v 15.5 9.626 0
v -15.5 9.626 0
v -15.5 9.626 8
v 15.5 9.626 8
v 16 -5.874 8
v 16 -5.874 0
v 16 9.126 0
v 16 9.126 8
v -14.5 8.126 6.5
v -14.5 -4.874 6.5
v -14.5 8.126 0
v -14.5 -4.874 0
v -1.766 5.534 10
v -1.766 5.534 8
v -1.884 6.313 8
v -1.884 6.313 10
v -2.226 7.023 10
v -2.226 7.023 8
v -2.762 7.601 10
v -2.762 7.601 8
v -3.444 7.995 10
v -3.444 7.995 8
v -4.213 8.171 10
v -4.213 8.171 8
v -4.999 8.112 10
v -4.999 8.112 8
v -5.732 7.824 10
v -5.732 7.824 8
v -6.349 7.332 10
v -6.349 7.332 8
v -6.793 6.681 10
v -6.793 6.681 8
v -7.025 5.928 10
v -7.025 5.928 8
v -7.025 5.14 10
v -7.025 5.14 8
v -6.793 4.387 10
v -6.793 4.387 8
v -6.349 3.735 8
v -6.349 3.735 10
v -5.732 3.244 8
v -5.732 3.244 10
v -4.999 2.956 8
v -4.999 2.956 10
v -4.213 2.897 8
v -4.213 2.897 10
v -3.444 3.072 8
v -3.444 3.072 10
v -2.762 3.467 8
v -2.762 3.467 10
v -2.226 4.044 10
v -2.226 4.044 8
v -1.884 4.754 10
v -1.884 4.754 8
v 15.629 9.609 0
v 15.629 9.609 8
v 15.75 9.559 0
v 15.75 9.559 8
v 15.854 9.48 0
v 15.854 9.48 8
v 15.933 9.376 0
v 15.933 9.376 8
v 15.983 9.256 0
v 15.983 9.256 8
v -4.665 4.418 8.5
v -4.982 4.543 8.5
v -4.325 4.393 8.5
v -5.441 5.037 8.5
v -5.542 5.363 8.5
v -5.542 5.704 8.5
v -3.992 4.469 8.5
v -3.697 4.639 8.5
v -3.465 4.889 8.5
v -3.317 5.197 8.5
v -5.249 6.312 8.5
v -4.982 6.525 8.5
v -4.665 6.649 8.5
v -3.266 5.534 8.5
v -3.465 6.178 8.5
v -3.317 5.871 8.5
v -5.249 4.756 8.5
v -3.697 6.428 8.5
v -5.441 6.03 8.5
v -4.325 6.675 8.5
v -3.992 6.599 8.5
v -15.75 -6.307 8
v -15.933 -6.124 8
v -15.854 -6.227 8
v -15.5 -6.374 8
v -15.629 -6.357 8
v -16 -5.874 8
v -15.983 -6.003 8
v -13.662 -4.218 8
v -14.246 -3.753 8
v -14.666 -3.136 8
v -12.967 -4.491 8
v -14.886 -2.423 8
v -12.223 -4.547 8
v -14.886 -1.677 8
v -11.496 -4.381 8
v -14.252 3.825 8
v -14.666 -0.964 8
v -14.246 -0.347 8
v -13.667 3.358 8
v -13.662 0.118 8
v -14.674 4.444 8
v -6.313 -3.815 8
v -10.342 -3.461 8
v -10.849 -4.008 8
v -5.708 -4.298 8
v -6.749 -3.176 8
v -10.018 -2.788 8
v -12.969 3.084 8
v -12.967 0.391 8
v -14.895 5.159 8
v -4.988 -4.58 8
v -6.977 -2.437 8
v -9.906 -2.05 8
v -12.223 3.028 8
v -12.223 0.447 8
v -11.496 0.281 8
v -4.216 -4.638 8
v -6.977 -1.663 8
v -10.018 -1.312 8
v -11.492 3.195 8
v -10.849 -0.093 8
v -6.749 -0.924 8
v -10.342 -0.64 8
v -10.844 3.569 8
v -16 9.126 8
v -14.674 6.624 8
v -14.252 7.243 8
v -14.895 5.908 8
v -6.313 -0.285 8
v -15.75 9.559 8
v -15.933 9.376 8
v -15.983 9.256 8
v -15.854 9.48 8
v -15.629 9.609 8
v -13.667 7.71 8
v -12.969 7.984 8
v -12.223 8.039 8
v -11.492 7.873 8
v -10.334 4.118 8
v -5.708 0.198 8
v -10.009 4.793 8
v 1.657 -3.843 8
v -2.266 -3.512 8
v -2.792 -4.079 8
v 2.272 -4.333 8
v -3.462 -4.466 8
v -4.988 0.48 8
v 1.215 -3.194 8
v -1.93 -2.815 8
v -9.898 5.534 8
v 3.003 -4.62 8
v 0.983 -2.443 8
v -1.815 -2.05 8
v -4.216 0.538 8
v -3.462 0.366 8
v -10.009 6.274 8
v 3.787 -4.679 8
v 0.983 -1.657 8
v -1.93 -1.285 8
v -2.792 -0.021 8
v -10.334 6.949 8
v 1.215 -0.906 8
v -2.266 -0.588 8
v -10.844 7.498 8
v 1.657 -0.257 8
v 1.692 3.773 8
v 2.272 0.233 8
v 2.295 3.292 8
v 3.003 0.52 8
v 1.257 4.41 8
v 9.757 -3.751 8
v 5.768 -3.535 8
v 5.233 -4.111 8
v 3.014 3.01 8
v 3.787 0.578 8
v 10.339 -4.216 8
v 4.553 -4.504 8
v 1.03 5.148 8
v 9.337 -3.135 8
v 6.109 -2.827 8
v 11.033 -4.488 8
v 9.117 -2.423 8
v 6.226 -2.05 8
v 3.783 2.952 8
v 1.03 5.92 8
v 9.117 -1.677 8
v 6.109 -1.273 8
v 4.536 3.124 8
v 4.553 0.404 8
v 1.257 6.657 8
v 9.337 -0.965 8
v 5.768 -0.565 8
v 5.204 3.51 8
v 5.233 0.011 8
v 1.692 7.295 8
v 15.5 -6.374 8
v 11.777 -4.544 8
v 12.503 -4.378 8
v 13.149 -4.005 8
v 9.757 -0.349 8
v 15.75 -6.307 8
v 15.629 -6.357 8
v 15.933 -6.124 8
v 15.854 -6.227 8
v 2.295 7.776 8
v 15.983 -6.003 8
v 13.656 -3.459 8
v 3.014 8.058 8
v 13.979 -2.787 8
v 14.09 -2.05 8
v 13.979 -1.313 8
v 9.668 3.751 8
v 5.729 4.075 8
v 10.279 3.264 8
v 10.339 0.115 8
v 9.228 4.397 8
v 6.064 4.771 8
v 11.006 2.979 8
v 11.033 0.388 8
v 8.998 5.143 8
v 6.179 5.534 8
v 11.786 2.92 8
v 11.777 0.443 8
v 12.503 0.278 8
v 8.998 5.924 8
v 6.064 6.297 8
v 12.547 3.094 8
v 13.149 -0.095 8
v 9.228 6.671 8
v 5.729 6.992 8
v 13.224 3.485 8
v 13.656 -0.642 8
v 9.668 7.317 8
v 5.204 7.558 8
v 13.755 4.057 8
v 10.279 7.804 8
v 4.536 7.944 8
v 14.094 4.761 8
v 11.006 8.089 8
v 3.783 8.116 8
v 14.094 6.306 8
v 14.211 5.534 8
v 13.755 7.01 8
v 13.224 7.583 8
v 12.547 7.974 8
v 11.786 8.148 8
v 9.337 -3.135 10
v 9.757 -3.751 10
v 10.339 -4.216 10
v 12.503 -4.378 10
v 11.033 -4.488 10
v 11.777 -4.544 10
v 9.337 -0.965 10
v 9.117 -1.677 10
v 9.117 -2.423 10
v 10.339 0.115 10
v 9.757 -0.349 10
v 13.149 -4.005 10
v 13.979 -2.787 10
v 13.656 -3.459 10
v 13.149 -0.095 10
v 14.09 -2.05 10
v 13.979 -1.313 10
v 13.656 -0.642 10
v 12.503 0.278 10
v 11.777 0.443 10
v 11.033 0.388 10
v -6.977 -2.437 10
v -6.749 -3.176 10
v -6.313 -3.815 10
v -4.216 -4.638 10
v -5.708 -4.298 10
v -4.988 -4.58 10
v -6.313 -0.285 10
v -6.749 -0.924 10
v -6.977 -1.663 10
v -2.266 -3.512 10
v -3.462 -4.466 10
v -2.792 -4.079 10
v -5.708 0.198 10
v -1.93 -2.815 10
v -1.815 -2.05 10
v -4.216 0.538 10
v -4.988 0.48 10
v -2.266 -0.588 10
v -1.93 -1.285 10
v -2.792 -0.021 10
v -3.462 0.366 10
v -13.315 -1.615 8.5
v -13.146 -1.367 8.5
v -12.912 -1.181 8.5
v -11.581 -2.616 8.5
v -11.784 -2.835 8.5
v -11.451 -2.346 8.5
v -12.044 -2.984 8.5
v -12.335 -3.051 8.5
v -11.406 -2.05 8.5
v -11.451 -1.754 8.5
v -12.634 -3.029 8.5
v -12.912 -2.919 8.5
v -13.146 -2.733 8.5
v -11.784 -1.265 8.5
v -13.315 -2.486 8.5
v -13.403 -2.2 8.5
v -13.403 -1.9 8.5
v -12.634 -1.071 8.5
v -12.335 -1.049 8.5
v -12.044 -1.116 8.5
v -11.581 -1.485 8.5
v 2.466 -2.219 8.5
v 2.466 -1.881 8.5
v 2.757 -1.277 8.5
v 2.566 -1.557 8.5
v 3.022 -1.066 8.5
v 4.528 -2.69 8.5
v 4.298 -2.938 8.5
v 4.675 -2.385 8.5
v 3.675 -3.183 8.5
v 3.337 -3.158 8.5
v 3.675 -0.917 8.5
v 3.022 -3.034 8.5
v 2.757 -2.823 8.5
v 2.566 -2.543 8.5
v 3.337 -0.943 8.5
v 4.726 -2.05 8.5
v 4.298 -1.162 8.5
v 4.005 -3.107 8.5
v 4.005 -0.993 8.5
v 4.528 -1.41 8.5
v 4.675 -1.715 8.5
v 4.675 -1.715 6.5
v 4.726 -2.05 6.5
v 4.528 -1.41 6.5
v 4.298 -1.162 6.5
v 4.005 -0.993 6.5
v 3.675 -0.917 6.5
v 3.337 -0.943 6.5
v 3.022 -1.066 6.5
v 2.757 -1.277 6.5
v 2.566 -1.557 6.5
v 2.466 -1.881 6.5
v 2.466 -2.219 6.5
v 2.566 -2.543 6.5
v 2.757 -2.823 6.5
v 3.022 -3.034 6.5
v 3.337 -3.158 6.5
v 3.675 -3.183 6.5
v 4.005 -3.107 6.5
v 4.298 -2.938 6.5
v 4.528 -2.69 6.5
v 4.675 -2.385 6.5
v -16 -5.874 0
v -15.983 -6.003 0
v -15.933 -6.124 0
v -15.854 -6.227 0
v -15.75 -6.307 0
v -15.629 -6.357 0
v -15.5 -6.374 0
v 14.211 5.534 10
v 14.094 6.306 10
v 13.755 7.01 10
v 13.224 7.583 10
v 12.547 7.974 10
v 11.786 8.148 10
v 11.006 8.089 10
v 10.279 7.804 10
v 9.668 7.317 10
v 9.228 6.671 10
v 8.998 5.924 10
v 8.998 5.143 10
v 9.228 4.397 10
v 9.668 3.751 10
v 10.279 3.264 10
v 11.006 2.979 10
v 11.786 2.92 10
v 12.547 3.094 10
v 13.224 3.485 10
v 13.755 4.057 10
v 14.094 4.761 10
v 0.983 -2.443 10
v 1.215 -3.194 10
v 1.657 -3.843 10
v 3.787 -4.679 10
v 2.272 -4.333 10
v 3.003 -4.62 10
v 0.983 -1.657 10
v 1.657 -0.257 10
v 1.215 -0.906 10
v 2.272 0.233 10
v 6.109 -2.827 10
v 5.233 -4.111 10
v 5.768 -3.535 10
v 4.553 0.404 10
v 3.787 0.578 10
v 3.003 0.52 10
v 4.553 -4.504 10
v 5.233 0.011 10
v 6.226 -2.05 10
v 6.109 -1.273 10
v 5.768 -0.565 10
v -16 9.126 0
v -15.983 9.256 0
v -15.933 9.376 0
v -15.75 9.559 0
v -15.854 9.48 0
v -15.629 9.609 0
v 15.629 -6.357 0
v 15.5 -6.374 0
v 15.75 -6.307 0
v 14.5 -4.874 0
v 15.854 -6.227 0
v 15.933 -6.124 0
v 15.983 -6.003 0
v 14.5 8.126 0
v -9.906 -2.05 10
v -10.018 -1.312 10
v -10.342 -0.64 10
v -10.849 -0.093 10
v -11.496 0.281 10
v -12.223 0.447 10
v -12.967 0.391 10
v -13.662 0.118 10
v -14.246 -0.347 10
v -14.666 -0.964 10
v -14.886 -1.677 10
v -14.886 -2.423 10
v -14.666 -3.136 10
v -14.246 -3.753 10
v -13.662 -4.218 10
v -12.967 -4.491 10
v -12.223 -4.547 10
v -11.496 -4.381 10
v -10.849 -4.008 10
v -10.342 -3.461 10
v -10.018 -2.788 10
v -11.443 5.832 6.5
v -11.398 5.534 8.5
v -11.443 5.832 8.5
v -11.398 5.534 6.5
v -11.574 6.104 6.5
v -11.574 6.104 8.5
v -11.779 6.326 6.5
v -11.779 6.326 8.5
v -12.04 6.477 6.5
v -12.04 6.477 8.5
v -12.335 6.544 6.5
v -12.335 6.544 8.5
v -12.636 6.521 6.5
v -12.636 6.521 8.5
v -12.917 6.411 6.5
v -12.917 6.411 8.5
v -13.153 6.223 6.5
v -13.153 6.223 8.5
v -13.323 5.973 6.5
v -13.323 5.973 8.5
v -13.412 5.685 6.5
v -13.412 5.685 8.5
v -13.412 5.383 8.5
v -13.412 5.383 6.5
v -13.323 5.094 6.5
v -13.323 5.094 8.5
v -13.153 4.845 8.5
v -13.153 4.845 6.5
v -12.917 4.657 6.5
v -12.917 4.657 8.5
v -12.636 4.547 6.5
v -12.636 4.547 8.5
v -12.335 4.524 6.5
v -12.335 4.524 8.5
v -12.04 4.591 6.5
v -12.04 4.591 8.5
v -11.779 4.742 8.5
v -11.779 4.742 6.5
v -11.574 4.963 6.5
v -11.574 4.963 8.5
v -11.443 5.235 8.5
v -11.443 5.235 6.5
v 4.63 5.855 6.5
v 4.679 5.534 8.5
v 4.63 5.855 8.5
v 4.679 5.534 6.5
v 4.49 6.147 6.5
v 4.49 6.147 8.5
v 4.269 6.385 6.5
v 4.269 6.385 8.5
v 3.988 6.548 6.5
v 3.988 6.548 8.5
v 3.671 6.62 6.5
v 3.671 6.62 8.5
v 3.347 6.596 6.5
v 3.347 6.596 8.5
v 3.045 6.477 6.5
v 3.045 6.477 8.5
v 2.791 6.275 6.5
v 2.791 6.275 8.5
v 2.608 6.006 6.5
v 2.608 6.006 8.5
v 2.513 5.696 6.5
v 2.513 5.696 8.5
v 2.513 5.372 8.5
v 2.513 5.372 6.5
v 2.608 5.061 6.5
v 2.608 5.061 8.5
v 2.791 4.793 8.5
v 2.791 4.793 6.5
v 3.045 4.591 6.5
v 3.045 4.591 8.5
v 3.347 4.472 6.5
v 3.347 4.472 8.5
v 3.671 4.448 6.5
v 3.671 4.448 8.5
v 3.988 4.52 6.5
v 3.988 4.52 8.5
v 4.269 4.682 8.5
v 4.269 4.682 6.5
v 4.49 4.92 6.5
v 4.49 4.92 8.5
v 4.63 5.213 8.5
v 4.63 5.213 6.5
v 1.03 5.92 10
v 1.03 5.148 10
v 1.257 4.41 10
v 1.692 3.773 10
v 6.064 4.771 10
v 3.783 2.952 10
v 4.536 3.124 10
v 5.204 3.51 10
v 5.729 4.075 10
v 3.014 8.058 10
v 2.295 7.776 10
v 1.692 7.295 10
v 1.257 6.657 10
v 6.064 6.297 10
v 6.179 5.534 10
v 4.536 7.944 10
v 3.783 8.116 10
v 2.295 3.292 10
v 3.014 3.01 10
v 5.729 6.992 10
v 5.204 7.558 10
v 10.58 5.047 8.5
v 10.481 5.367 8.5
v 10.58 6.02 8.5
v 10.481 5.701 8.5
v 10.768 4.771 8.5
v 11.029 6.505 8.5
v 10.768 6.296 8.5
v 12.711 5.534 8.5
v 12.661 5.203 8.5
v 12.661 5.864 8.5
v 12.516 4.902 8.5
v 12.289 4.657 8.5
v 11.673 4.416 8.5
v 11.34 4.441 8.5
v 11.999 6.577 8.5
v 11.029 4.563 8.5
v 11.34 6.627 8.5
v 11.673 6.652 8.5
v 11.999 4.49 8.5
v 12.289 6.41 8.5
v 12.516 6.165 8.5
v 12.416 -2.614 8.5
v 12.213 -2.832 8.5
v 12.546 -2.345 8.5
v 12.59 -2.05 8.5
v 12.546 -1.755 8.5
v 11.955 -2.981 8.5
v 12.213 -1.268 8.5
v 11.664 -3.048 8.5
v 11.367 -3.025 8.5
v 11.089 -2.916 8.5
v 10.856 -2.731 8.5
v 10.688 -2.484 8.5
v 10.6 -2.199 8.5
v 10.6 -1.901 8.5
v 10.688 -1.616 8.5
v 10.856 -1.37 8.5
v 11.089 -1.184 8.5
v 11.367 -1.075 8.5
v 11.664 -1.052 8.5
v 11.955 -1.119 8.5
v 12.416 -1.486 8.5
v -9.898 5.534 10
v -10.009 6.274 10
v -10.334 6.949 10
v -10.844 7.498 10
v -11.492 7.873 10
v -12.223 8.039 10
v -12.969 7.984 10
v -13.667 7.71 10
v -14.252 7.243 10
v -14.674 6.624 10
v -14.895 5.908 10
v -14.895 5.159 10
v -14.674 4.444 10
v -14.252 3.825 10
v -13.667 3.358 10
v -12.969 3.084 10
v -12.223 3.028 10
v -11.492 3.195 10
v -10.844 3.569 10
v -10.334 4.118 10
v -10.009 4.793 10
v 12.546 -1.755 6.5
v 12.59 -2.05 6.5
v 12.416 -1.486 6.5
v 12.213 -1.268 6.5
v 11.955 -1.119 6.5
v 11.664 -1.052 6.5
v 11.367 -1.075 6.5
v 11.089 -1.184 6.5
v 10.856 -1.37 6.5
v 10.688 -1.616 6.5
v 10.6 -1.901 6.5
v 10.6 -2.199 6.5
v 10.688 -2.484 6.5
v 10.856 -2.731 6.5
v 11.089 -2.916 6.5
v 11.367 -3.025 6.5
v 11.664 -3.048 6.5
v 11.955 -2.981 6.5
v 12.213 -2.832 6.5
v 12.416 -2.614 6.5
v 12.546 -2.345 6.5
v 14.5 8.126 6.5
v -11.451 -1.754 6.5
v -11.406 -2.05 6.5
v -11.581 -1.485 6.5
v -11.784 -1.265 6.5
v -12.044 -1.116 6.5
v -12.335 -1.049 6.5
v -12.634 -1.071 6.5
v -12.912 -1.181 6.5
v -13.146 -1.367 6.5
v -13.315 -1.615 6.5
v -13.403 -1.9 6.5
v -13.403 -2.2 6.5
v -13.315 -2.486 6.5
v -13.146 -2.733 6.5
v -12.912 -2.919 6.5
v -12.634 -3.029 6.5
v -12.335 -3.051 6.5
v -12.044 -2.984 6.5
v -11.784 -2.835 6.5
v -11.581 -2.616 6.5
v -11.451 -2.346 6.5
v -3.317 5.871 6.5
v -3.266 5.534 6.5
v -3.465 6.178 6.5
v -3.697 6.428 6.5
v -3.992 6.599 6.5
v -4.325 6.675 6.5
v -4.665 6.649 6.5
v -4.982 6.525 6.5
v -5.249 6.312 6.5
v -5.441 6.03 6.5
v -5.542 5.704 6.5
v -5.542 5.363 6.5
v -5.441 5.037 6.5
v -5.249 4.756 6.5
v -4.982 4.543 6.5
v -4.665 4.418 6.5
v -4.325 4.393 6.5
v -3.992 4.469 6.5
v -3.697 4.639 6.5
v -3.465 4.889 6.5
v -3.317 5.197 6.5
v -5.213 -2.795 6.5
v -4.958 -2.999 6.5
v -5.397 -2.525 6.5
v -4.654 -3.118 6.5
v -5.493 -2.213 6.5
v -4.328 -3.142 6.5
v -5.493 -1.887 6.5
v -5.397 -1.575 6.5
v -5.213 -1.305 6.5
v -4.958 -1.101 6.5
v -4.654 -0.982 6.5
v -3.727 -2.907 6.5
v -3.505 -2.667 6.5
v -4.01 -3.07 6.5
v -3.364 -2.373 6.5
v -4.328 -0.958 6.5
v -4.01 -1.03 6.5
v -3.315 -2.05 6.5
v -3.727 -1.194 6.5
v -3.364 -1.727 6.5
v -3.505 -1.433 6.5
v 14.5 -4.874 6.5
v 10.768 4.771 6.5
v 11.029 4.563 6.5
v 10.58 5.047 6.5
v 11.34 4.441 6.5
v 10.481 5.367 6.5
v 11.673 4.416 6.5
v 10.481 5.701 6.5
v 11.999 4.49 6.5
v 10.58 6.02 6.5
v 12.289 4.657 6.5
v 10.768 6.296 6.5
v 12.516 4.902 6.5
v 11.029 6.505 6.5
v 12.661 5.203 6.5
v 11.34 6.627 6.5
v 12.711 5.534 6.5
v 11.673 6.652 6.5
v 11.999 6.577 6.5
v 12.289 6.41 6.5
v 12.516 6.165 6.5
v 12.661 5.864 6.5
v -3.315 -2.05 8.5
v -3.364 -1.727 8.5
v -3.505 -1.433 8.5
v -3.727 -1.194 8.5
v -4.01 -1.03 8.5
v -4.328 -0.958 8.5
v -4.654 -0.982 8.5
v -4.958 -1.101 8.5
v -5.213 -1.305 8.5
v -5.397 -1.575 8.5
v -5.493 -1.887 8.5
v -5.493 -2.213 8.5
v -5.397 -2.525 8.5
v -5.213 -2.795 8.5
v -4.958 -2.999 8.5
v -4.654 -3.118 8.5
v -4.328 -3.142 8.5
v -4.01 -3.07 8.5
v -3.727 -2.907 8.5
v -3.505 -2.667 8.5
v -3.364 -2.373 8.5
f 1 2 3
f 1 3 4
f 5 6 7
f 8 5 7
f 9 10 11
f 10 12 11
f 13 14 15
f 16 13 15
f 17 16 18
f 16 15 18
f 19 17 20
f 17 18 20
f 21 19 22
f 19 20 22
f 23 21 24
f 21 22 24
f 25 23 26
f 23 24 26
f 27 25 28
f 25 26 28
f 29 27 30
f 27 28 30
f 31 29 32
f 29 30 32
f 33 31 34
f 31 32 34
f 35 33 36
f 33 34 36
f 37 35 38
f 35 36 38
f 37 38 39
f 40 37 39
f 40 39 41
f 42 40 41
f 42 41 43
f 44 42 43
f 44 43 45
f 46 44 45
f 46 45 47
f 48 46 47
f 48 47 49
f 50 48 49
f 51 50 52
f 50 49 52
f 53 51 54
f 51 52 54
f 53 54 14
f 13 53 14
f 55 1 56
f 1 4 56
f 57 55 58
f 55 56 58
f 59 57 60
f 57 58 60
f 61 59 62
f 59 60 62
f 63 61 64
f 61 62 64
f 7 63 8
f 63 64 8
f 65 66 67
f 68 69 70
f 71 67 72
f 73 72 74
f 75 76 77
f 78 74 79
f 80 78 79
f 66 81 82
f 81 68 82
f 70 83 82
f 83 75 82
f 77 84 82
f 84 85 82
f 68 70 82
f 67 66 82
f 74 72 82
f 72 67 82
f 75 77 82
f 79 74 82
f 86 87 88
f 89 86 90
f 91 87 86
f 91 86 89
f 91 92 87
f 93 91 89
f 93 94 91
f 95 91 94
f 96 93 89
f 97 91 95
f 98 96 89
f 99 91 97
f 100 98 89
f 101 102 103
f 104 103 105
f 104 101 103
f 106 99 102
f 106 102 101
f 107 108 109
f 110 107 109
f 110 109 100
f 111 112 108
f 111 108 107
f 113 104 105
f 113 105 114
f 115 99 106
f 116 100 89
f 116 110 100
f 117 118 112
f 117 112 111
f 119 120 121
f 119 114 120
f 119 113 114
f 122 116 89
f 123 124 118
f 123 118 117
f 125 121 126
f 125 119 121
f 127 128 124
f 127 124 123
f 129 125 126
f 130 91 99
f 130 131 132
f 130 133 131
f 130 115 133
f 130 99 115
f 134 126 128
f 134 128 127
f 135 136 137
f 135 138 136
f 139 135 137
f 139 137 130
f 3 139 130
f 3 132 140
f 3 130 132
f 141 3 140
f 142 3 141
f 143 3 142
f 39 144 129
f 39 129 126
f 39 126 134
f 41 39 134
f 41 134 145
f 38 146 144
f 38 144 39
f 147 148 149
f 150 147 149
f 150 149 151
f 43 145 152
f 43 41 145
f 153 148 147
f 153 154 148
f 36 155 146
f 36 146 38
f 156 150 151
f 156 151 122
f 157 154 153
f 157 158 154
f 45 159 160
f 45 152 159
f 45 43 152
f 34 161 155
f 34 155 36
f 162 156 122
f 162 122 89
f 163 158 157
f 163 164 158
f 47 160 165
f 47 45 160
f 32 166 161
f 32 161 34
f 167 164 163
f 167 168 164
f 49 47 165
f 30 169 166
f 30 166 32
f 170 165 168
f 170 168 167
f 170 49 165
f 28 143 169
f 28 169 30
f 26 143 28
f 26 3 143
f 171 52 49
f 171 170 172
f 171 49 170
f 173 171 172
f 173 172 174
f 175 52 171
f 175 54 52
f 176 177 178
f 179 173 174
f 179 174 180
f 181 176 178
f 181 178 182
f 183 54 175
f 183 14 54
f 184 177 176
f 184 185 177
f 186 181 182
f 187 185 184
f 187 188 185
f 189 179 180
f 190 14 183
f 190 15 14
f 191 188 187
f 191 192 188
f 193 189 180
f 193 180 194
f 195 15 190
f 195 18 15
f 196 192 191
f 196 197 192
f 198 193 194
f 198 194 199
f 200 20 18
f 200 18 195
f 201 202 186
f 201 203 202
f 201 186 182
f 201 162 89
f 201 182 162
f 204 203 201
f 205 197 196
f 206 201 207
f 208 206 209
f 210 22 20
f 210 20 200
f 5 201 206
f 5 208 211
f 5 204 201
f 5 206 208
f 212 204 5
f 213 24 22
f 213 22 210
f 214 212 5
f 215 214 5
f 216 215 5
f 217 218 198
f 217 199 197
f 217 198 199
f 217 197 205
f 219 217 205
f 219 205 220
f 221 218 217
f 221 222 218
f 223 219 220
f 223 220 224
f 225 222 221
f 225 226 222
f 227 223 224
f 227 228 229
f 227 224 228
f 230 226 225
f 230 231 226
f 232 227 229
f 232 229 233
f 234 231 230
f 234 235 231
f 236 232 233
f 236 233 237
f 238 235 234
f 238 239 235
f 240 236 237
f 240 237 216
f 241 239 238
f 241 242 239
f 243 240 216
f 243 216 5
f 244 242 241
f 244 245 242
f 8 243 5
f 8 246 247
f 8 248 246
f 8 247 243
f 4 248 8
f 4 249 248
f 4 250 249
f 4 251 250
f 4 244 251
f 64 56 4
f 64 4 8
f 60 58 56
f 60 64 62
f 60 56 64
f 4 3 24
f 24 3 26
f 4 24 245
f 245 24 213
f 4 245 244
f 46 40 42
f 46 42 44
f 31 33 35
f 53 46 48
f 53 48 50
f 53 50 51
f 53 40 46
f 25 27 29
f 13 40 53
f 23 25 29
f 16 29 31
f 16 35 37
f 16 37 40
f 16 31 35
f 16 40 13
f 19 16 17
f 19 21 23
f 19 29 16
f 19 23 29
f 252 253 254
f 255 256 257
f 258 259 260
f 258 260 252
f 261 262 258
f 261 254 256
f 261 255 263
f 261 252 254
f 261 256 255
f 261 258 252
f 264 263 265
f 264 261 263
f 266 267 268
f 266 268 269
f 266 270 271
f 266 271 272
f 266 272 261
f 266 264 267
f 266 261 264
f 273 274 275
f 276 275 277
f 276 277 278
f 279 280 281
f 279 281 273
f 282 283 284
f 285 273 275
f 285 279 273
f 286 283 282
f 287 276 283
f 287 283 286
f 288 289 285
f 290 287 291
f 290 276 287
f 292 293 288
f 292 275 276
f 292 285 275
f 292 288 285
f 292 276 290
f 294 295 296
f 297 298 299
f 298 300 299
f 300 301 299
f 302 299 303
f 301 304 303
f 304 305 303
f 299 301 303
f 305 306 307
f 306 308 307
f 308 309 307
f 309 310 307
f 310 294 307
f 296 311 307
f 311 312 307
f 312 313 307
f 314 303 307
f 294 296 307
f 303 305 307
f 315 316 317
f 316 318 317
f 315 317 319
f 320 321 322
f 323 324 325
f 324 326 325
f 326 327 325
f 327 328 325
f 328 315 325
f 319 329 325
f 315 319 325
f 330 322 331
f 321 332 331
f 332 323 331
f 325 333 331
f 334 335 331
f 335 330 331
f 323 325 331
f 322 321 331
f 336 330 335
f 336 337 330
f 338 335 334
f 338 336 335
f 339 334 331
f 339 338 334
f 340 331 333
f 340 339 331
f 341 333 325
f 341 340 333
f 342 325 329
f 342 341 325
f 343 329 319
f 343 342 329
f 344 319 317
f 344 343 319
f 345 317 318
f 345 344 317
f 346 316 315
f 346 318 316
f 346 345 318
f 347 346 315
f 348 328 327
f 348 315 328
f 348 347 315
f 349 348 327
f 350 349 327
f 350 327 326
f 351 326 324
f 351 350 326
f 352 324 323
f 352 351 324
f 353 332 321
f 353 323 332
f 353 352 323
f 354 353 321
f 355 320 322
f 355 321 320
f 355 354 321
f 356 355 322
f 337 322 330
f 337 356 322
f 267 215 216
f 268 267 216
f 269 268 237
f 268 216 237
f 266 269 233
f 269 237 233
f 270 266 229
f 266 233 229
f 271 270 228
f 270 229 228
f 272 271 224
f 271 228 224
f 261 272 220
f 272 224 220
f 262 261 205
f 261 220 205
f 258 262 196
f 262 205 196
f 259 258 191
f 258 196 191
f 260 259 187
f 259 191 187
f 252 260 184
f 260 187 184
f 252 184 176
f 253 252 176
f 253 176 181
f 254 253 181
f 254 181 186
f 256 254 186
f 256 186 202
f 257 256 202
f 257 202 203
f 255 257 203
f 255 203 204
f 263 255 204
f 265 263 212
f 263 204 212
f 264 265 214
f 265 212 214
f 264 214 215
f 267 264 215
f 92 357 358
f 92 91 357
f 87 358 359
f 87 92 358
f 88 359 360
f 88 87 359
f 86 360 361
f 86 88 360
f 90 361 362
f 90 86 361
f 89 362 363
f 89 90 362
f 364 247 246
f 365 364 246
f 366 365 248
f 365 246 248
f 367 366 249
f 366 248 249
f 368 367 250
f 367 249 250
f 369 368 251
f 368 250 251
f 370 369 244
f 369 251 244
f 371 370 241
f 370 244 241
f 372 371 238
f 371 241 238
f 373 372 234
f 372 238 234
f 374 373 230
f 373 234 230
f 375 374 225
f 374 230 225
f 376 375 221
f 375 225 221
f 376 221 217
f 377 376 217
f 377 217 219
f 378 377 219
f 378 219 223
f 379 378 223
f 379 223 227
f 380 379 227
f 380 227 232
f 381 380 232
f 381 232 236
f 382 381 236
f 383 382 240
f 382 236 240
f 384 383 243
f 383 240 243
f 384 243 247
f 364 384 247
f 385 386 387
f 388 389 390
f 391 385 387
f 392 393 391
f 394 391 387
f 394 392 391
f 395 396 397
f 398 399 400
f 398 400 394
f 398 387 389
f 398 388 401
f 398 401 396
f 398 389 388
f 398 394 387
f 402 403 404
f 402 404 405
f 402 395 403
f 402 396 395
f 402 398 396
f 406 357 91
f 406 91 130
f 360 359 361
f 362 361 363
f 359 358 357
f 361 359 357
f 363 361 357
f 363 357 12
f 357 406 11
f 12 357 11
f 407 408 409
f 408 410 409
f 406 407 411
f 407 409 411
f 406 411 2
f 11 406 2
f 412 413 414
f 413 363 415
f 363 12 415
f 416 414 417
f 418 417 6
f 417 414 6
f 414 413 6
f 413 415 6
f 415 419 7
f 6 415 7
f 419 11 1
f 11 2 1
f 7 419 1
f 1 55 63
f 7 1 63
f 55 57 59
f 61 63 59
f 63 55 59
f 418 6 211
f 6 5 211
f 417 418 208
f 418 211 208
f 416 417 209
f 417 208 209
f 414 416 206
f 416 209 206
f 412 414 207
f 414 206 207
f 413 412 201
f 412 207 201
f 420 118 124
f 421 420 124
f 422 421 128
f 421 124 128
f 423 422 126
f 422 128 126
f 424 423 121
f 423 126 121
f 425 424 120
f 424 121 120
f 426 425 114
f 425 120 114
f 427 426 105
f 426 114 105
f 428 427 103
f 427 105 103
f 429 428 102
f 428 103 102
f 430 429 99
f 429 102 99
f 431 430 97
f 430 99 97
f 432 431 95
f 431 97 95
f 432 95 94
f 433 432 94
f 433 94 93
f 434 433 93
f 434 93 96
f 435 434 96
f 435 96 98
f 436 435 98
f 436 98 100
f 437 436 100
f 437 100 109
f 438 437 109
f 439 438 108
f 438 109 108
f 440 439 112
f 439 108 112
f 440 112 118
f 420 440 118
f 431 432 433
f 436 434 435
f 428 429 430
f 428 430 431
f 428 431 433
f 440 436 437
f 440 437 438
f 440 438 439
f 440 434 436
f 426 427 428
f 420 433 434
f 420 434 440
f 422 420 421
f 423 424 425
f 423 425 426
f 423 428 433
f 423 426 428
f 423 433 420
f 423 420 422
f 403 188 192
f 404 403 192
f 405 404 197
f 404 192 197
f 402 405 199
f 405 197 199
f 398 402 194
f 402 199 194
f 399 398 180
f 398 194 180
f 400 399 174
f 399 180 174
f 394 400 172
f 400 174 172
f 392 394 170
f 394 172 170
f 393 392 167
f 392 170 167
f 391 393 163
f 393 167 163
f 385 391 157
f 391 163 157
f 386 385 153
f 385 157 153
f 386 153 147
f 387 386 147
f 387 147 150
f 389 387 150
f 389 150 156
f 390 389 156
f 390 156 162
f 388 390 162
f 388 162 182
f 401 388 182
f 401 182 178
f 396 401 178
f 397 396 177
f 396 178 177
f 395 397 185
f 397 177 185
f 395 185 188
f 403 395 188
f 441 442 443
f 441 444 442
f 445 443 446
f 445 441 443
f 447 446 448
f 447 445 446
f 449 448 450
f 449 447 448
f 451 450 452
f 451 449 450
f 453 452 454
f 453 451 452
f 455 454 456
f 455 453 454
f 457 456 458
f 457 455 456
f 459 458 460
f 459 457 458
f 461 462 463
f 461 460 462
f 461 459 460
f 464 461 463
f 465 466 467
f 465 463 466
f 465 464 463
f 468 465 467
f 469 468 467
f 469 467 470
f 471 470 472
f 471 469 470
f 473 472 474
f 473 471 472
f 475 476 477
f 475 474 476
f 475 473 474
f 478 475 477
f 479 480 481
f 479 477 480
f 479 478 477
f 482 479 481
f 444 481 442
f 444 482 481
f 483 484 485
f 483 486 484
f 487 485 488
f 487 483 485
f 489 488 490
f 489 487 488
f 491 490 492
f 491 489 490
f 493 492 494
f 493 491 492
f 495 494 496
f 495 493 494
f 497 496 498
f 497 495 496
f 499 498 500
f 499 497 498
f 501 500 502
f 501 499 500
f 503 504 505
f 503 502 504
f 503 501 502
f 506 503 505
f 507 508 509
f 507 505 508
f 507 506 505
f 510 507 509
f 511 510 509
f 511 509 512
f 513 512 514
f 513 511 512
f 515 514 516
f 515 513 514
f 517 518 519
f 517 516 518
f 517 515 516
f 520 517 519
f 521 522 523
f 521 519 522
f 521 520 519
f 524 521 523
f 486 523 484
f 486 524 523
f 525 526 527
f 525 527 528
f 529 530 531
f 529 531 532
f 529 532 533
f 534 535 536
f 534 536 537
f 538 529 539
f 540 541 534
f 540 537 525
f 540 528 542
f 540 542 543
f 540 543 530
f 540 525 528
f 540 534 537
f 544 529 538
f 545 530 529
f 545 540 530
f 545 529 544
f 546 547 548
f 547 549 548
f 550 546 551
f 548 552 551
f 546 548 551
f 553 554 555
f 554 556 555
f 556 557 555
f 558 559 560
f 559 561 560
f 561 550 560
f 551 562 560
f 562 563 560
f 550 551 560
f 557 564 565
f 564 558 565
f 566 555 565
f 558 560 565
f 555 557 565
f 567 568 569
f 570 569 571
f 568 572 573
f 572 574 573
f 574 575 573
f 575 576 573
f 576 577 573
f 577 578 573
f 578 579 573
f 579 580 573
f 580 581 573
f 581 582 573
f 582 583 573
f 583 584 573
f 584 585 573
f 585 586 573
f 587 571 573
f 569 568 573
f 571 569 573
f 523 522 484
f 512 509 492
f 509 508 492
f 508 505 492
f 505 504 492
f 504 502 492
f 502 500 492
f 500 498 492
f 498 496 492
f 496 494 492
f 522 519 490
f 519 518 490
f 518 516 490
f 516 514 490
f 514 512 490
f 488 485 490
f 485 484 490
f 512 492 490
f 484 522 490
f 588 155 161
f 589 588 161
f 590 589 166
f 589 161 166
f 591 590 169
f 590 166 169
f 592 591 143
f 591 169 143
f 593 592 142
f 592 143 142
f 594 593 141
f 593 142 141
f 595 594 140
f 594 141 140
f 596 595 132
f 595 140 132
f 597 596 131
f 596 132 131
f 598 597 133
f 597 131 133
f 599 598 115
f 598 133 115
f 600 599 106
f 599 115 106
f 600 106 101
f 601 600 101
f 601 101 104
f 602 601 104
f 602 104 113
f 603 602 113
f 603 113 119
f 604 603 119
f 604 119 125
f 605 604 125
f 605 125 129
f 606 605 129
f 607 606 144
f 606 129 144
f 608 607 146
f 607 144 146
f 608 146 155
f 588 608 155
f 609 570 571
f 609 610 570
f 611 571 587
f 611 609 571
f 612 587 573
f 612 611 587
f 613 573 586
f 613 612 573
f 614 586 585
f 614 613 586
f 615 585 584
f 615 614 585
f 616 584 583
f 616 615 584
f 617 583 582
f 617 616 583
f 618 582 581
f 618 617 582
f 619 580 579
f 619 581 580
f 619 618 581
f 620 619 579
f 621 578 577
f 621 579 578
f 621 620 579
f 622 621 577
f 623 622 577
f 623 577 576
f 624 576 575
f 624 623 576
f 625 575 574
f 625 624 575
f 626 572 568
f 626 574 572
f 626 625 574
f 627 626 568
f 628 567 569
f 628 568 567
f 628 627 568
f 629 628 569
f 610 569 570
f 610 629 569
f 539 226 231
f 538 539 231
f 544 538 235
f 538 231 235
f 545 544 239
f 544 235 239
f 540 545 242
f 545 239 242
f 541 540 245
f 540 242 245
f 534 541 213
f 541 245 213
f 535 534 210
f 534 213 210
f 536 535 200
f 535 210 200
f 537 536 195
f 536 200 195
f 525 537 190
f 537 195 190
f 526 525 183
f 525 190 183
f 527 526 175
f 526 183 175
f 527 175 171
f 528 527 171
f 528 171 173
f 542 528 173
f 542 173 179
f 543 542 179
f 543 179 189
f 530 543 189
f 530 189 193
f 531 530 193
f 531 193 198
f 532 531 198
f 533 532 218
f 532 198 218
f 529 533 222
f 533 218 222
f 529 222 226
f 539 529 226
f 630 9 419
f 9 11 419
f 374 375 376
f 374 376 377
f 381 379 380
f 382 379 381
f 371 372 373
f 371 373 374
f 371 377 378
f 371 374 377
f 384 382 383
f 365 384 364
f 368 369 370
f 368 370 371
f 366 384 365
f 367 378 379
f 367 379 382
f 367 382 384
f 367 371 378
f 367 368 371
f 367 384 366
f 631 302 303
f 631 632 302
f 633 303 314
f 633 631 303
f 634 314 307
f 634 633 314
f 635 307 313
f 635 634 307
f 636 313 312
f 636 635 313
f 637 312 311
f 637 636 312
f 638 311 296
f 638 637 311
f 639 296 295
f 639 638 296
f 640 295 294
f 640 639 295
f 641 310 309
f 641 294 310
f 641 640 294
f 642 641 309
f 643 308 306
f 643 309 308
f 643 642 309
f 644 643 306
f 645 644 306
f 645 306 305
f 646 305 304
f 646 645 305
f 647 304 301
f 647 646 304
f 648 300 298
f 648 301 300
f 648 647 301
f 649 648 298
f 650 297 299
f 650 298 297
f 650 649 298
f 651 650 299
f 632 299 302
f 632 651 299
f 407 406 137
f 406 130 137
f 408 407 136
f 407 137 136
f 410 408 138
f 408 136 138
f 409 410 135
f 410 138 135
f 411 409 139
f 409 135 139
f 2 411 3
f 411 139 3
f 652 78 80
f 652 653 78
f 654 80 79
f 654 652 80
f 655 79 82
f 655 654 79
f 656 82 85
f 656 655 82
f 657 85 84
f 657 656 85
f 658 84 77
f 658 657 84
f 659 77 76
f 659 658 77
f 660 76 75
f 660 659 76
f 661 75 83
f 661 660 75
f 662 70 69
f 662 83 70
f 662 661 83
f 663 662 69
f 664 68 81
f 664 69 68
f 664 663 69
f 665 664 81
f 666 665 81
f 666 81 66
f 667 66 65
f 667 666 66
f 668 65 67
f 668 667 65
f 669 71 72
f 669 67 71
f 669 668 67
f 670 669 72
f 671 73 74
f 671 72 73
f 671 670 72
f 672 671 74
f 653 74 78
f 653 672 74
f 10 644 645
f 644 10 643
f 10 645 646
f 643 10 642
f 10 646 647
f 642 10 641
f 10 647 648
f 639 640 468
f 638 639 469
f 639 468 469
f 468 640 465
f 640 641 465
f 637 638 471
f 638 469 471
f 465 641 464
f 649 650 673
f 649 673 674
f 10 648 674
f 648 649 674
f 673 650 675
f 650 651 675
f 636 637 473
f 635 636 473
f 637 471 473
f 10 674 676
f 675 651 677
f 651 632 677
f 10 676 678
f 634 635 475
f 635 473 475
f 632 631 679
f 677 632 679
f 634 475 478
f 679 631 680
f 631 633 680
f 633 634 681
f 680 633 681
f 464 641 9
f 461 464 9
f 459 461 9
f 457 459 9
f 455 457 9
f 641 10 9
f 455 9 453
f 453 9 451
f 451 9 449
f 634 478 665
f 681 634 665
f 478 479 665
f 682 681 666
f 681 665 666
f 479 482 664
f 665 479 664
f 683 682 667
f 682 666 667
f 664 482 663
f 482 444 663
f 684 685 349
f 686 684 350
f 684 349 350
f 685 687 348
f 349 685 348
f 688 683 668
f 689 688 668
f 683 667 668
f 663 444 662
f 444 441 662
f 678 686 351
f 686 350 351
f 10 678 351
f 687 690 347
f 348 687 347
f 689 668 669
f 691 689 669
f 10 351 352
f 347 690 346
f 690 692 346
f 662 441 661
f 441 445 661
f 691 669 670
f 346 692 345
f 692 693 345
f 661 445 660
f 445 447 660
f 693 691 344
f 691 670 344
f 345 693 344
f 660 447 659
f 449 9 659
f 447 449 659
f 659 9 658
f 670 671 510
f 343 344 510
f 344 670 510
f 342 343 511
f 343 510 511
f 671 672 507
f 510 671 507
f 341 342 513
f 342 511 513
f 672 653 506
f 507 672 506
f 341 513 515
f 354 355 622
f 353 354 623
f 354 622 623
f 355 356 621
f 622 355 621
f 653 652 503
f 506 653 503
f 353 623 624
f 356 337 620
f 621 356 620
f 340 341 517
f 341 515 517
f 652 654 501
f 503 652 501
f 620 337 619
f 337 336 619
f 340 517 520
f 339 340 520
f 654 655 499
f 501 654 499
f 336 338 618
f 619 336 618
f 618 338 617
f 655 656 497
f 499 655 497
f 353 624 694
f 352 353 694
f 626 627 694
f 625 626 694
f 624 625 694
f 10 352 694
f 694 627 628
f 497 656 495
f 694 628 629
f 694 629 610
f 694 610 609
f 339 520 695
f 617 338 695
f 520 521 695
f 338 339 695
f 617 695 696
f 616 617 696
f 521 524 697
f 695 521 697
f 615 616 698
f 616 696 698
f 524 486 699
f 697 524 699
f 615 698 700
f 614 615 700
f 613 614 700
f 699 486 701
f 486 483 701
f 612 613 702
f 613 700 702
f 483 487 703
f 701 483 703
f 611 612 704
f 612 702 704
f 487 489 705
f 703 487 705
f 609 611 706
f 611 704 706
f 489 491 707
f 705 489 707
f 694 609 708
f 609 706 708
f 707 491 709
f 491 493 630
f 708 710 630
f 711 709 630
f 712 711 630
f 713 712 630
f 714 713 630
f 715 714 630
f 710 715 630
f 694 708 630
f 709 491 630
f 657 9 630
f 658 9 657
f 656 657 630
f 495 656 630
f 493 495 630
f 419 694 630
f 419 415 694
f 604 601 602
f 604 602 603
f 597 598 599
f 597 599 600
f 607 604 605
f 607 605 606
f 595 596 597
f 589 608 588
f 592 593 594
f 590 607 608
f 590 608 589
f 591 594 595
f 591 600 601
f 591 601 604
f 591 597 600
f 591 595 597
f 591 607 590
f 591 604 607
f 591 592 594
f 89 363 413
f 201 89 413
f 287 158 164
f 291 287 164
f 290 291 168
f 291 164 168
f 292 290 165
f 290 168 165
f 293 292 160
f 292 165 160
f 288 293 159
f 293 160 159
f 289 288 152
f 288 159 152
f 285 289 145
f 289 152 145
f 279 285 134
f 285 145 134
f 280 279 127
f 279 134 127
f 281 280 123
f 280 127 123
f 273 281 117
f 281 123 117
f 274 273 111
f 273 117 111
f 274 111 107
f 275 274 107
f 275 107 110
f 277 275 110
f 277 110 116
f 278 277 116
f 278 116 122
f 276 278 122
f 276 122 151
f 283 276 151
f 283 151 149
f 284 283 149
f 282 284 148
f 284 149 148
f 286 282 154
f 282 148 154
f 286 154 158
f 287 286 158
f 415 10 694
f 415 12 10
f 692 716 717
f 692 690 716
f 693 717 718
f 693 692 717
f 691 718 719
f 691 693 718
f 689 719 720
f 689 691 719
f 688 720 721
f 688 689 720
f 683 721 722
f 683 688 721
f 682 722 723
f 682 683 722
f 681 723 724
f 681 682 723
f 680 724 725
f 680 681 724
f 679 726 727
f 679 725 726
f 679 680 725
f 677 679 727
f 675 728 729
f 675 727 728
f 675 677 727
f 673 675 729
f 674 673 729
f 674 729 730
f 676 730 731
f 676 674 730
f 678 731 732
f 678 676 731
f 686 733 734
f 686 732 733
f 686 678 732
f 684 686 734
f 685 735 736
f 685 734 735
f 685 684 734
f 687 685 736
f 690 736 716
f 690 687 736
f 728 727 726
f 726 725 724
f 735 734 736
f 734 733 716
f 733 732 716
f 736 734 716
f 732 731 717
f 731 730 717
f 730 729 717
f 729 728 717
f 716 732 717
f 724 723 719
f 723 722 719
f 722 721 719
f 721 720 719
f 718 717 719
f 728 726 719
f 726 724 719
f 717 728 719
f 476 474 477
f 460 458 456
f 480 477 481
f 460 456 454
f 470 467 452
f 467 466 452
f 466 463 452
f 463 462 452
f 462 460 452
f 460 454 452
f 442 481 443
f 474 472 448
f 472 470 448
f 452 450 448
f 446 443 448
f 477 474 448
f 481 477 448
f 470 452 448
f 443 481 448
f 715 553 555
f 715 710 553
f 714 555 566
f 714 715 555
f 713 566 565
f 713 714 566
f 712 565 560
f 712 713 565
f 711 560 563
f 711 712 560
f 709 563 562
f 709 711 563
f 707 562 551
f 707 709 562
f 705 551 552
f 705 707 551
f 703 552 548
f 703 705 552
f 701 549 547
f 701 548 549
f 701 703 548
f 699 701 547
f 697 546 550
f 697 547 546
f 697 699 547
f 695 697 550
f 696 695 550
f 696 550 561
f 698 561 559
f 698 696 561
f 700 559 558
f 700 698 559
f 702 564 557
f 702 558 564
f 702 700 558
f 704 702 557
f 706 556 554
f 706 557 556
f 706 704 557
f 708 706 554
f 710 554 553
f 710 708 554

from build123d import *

# Parameters (mm, degrees)
F0_W     = 32
F0_H     = 16
F1_DEPTH = 8
F3_R     = 2.5890653677
F3_R_2   = 2.5126878493
F3_R_3   = 2.6441660213
F3_R_4   = 2.5038047819
F3_R_5   = 2.6210090881
F3_R_6   = 2.500461059
F3_R_7   = 2.6359235988
F3_R_8   = 2.5954418061
F4_DEPTH = 2
F5_R     = 0.5
F6_R     = 0.5
F7_R     = 0.5
F8_T     = -1.5


with BuildPart() as f1:
    # F0 (on Top) → F1 (new body)
    with BuildSketch(Plane.XY):
        with Locations((0, 1.6263736921)):
            Rectangle(F0_W, F0_H)
    extrude(amount=F1_DEPTH)

    # F3 (on offset) → F4 (join)
    with BuildSketch(Plane.XY.offset(8)):
        with Locations((3.5897120633, 5.5338214714)):
            Circle(F3_R)
        with Locations((-12.4102879367, 5.5338214714)):
            Circle(F3_R_2)
        with Locations((-4.4102879367, 5.5338214714)):
            Circle(F3_R_3)
        with Locations((-12.4102879367, -2.0500652119)):
            Circle(F3_R_4)
        with Locations((11.5897120633, 5.5338214714)):
            Circle(F3_R_5)
        with Locations((11.5897120633, -2.0500652119)):
            Circle(F3_R_6)
        with Locations((3.5897120633, -2.0500652119)):
            Circle(F3_R_7)
        with Locations((-4.4102879367, -2.0500652119)):
            Circle(F3_R_8)
    extrude(amount=F4_DEPTH)

    # F5
    f5_edges = [f1.edges().sort_by_distance(p)[0] for p in [
        (-16, 9.626374, 4),
    ]]
    fillet(f5_edges, radius=F5_R)

    # F6
    f6_edges = [f1.edges().sort_by_distance(p)[0] for p in [
        (16, 9.626374, 4),
    ]]
    fillet(f6_edges, radius=F6_R)

    # F7
    f7_edges = [f1.edges().sort_by_distance(p)[0] for p in [
        (16, -6.373626, 4),
        (-16, -6.373626, 4),
    ]]
    fillet(f7_edges, radius=F7_R)

    # F8
    f8_openings = [f1.faces().sort_by_distance(p)[0] for p in [
        (0, 1.626374, 0),
    ]]
    offset(amount=F8_T, openings=f8_openings, kind=Kind.INTERSECTION)


solid = f1.part
